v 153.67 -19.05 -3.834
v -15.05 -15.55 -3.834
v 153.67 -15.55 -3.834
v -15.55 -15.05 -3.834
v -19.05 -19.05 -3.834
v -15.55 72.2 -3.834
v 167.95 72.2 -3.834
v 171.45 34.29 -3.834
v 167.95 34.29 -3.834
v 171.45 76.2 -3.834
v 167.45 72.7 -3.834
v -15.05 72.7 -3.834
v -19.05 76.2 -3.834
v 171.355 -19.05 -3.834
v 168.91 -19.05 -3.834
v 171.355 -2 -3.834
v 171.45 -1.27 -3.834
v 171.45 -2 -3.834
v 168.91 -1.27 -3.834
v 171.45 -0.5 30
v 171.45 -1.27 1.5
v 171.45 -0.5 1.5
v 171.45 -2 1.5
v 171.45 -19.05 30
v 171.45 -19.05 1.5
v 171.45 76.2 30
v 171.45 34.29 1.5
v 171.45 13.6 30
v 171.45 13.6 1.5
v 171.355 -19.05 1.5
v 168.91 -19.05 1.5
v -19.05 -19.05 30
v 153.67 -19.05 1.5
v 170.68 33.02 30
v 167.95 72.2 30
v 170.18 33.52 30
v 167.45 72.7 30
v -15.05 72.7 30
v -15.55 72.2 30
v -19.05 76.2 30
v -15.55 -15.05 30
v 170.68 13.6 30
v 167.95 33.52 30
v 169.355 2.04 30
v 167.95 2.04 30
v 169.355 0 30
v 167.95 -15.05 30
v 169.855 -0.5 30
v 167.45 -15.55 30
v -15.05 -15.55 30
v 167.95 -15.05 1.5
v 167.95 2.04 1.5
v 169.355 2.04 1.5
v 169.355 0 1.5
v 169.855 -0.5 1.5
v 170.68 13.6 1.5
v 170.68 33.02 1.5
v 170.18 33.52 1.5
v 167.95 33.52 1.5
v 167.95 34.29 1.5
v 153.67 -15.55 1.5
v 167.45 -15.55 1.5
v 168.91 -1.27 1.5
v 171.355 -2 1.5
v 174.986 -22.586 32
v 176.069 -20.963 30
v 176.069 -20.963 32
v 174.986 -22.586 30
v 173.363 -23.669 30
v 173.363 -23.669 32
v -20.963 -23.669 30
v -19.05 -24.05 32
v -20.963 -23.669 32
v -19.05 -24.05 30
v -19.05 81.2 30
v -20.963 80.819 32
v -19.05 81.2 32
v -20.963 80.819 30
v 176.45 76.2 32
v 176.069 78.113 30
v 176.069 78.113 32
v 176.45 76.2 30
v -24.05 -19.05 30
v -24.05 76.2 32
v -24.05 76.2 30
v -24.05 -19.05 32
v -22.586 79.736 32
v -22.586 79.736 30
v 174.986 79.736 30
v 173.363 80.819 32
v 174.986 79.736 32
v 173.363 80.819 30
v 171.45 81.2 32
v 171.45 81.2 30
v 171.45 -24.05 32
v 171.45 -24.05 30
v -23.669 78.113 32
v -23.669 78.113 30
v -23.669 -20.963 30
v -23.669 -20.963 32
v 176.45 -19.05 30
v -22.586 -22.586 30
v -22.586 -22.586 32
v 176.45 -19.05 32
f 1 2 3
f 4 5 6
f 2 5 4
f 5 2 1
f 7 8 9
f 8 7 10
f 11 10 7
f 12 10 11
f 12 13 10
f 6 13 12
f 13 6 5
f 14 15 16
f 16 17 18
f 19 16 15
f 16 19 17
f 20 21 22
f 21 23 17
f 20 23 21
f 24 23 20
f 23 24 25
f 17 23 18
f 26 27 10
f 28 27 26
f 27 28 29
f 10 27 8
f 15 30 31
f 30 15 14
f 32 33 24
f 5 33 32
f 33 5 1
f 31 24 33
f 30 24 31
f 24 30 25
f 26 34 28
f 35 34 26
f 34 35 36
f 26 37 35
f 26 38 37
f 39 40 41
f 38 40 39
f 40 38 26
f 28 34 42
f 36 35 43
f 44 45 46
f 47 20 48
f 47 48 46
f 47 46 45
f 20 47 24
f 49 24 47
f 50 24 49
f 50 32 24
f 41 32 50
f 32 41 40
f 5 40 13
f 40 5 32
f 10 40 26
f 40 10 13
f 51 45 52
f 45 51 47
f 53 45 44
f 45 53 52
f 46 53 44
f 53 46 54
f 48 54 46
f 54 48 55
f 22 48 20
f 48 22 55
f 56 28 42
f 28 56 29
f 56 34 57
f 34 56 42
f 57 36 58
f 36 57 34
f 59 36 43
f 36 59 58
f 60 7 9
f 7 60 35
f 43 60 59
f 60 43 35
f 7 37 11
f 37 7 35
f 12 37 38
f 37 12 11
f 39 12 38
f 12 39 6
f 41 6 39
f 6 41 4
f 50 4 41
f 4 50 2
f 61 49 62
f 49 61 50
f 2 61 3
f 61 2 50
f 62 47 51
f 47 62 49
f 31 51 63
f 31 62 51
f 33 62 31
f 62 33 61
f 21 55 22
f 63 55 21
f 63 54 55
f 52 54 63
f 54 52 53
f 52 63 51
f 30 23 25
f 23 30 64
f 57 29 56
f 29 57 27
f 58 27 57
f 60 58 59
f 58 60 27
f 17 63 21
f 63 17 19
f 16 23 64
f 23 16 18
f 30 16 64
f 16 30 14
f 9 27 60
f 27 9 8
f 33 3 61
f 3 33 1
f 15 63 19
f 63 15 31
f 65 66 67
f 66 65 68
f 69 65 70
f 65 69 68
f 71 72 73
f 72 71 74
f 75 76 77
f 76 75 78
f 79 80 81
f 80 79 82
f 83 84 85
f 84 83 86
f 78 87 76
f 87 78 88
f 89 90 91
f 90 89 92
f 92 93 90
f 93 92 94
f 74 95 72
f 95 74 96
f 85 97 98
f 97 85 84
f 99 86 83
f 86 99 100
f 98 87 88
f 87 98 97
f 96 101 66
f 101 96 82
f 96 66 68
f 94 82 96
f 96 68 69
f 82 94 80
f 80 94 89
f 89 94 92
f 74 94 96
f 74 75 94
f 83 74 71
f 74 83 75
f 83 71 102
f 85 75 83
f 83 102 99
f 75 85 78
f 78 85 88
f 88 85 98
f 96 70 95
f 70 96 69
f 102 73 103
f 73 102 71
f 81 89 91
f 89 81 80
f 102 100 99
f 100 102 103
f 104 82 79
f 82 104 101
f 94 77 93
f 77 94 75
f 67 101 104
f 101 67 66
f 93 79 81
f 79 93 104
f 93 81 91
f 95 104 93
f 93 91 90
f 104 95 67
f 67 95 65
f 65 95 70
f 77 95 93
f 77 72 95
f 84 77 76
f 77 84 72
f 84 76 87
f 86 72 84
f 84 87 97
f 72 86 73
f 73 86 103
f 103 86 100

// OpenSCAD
// file: ../../../lib/circuits/helpers.scad
function bu(u) = u * 2.54;

module breadboard_row(number, orientation="vertical") {
  children();
  if(number > 1) {
    if(orientation == "vertical") {
      translate([0,bu(1),0])
        breadboard_row(number-1, orientation=orientation) {
          children();
        }
    } else {
      translate([bu(1),0,0])
        breadboard_row(number-1, orientation=orientation){
          children();
        }
    }
  }
}
// file: ../../../lib/switches/rgb.scad
include <../variables.scad>

module rgb_row_trace_connection(width, height, xpos, ypos, rgb, connections) {
  half_width = u_mm(width)/2;
  half_height = u_mm(height)/2;
  if(connections[3] == "connect") {
    translate([1-half_width,8.875,0]){
      circle(d=0.8,$fn=40);
      offset(0.4)
        polygon(points=[[0,-0.01],[0,0.01],[u_mm(-xpos)-2, u_mm(-ypos)+0.01],[u_mm(-xpos)-2, u_mm(-ypos)-0.01]]);
    }
    translate([1-half_width,4.9,0]){
      circle(d=0.8,$fn=40);
      offset(0.4)
        polygon(points=[[0,-0.01],[0,0.01],[u_mm(-xpos)-2, u_mm(-ypos)+0.01],[u_mm(-xpos)-2, u_mm(-ypos)-0.01]]);
    }
    translate([1-half_width,3.3,0]){
      circle(d=0.8,$fn=40);
      offset(0.4)
        polygon(points=[[0,-0.01],[0,0.01],[u_mm(-xpos)-2, u_mm(-ypos)+0.01],[u_mm(-xpos)-2, u_mm(-ypos)-0.01]]);
    }
  }
  if(connections[2] == "connect") {
    translate([half_width-1,8.875,0]) {
      circle(d=0.8,$fn=40);
    }
    translate([half_width-1,4.9,0]) {
      circle(d=0.8,$fn=40);
    }
    translate([half_width-1,3.3,0]){
      circle(d=0.8,$fn=40);
    }
  }
}

module rgb_pcb_drill(width=1, height=1, rgb=true, connections=["hole","hole","hole","hole"]) {
  half_width = u_mm(width)/2;
  half_height = u_mm(height)/2;
  translate([half_width,half_height,0]) {
    if(rgb == true) {
      // LED Hole
      translate([-1.875,3.4])
        square([3.75,3]);

      // LED D
      if(connections[3] == "hole")
        translate([1.3-half_width,8,0])
          circle(d=1,$fn=40);
      if(connections[2] == "hole")
        translate([half_width-1.3,8,0])
          circle(d=1,$fn=40);

      // LED G
      if(connections[3] == "hole")
        translate([1.3-half_width,5.4,0])
          circle(d=1,$fn=40);
      if(connections[2] == "hole")
        translate([half_width-1.3,5.4,0])
          circle(d=1,$fn=40);

      // LED V
      if(connections[3] == "hole")
        translate([1.3-half_width,2.8,0])
          circle(d=1,$fn=40);
      if(connections[2] == "hole")
        translate([half_width-1.3,2.8,0])
          circle(d=1,$fn=40);
    }

    children();
  }
}

module rgb_pcb_hole_traces(width=1, height=1, rgb=true, xpos=0, ypos=0, connections=["hole","hole","hole","hole"]) {
  half_width = u_mm(width)/2;
  half_height = u_mm(height)/2;
  translate([half_width,half_height,0]) {
    if(rgb == true) {
      // LED D
      if(connections[3] == "hole")
        translate([1.3-half_width,8,0])
          circle(d=2.5,$fn=40);
      if(connections[2] == "hole")
        translate([half_width-1.3,8,0])
          circle(d=2.5,$fn=40);

      // LED G
      if(connections[3] == "hole")
        translate([1.3-half_width,5.4,0])
          circle(d=2.5,$fn=40);
      if(connections[2] == "hole")
        translate([half_width-1.3,5.4,0])
          circle(d=2.5,$fn=40);

      // LED V
      if(connections[3] == "hole")
        translate([1.3-half_width,2.8,0])
          circle(d=2.5,$fn=40);
      if(connections[2] == "hole")
        translate([half_width-1.3,2.8,0])
          circle(d=2.5,$fn=40);
    }

    children();
  }
}

module rgb_pcb_traces(width=1, height=1, rgb=true, xpos=0, ypos=0, connections=["hole","hole","hole","hole"]) {
  half_width = u_mm(width)/2;
  half_height = u_mm(height)/2;
  rgb_pcb_hole_traces(width=width, height=height, rgb=rgb, connections=connections) {
    if(rgb == true) {
      rgb_row_trace_connection(width=width, height=height, xpos=xpos, ypos=ypos, rgb=rgb, connections=connections);
      v_left = connections[3] == "none" ? 1 : half_width-5;
      // LED G
      translate([1.25,5])
        square([2,2]);
      translate([2.7,8.5,0]) {
        length = connections[2] == "none" ? 2 : half_width-3.7; 
        square([length,0.75]);
      }
      translate([2.7,6.8])
        square([0.8,2.4]);
      translate([-3.5,6.2])
        square([7,0.8]);
      translate([-3.5,6.8])
        square([0.8,2.4]);
      translate([-4-v_left,8.5,0])
        square([v_left+1,0.75]);

      // LED D
      translate([-4-v_left,4.5,0])
        square([v_left,0.8]);
      translate([-4.5,4.5,0])
        square([0.8,1.3]);
      translate([-4.5,5,0])
        square([1.3,0.8]);
      translate([2,4,0])
        square([2,0.8]);
      translate([4,4,0])
        square([0.8,1.3]);
      translate([4,4.5,0]) {
        length = connections[2] == "none" ? 0 : half_width-5; 
        square([length,0.75]);
      }
      translate([-3.375,5])
        square([2,1.1]);
      translate([1.25,3.75])
        square([2,1.1]);

      // LED V
      v_right = connections[2] == "none" ? 0 : half_width-5.25;
      translate([-4-v_left,2.9,0])
        square([v_right+v_left+8.875,0.8]);
      translate([-3.375,3.5])
        square([2,1.35]);
    }

    children();
  }
}
// file: ../../../lib/switches/base.scad
include <../variables.scad>
include <rgb.scad>

// ["top", "bottom", "left", "right"]

module switch_row_trace_connection(width, height, xpos, ypos, rgb, connections) {
  half_width = u_mm(width)/2;
  half_height = u_mm(height)/2;
  if(connections[3] == "connect") {
    translate([1-half_width,-5.5,0]){
      circle(d=0.8,$fn=40);
      offset(0.4)
        polygon(points=[[0,-0.01],[0,0.01],[u_mm(-xpos)-2, u_mm(-ypos)+0.01],[u_mm(-xpos)-2, u_mm(-ypos)-0.01]]);
    }
  }
  if(connections[2] == "connect") {
    translate([half_width-1,-5.5,0]) {
      circle(d=0.8,$fn=40);
    }
  }
}

module switch_column_trace_connection(width, height, xpos, ypos, rgb, connections, last_xpos=0, last_ypos=0) {
  half_width = u_mm(width)/2;
  half_height = u_mm(height)/2;
  if(connections[1] == "connect") {
    translate([-u_mm((width-1)/2)-0.9,half_height-1,0]) {
      circle(d=0.8,$fn=40);
      offset(0.4)
        polygon(points=[[0,-0.01],[0,0.01],[u_mm((width-1)/2),0.01],[u_mm((width-1)/2),-0.01]]);
    }
  }
  if(connections[0] == "connect") {
    y_off = u_mm(ypos-last_ypos);
    x_off = u_mm(last_xpos-xpos);
    translate([-0.875,-1-y_off-half_height,0]) {
      offset(0.4)
        polygon(points=[[-0.01+x_off,0],[0.01+x_off,0],[0.01,2+y_off],[-0.01,2+y_off]]);
      translate([x_off-0.01,0]) {
        offset(0.4)
          polygon(points=[[0,-0.01],[0,0.01],[u_mm((width-1)/2)+1,0.01],[u_mm((width-1)/2)+1,-0.01]]);
      }
    }
  }
}

module switch_base_pcb_drill(width=1, height=1, rgb=true, single=true, connections=["hole","hole","hole","hole"]) {
  half_width = u_mm(width)/2;
  half_height = u_mm(height)/2;
  rgb_pcb_drill(width=width, height=height, rgb=rgb, connections=connections) {
    // Row
    if(connections[2] == "hole")
      translate([half_width-1.3,-5.5,0])
        circle(d=1,$fn=40);
    if(connections[3] == "hole")
      translate([1.3-half_width,-5.5,0])
        circle(d=1,$fn=40);

    // Column
    if(connections[1] == "hole")
      translate([-1,half_height-1.25,0])
        circle(d=1,$fn=40);
    if(connections[0] == "hole")
      translate([-1,1.25-half_height,0])
        circle(d=1,$fn=40);

    children();
  }
}

module switch_base_pcb_traces(width=1, height=1, rgb=true, xpos=0, ypos=0, connections=["hole","hole","hole","hole"], last_xpos=0, last_ypos=0, single=true) {
  half_width = u_mm(width)/2;
  half_height = u_mm(height)/2;
  rgb_pcb_traces(width=width, height=height, rgb=rgb, xpos=xpos, ypos=ypos, connections=connections) {
    switch_row_trace_connection(width, height, xpos, ypos, rgb, connections);
    if(single && !rgb)
      switch_column_trace_connection(width, height, xpos, ypos, rgb, connections, last_xpos=last_xpos, last_ypos=last_ypos);

    // Row
    if(connections[2] == "hole")
      translate([half_width-1.3,-5.5,0])
        circle(d=2.5,$fn=40);
    if(connections[3] == "hole")
      translate([1.3-half_width,-5.5,0])
        circle(d=2.5,$fn=40);

    // Column
    if(connections[1] == "hole")
      translate([-1,half_height-1.25,0])
        circle(d=2.4,$fn=40);
    if(connections[0] == "hole")
      translate([-1,1.25-half_height,0])
        circle(d=2.4,$fn=40);

    children();
  }
}

module switch_base_pcb_traces_bottom(width=1, height=1, rgb=true, xpos=0, ypos=0, connections=["hole","hole","hole","hole"], last_xpos=0, last_ypos=0) {
  half_width = u_mm(width)/2;
  half_height = u_mm(height)/2;
  rgb_pcb_hole_traces(width=width, height=height, rgb=rgb, connections=connections) {
    switch_column_trace_connection(width, height, xpos, ypos, rgb, connections, last_xpos=last_xpos, last_ypos=last_ypos);

    // Row
    if(connections[2] == "hole")
      translate([half_width-1.3,-5.5,0])
        circle(d=2.5,$fn=40);
    if(connections[3] == "hole")
      translate([1.3-half_width,-5.5,0])
        circle(d=2.5,$fn=40);

    // Column
    if(connections[1] == "hole")
      translate([-1,half_height-1.25,0])
        circle(d=2.5,$fn=40);
    if(connections[0] == "hole")
      translate([-1,1.25-half_height,0])
        circle(d=2.5,$fn=40);

    children();
  }
}
// file: ../../../lib/switches/footprints.scad
include <../variables.scad>
include <stabilizers.scad>

module pcb_switch_outline(width=1, height=1) {
  stab_extra = width >= 2 ? 2 : 0;
  translate([0,-stab_extra])
    square([u_mm(width)+0.01, u_mm(height)+0.01+stab_extra]);
}

module pcb_switch_space_outline(width=1, height=1, style="mx", cnc=false) {
  offset = height_for_style(style);
  stab_extra = width >= 2 ? 2 : 0;
  translate([-1,-1-stab_extra,2.834-offset])
    cube([u_mm(width) + 2, u_mm(height) + 2 + stab_extra, 1.166+offset]);
  translate([u_mm(width/2),u_mm(height/2)]) {
    translate([-7.5,-7.5,1.5-offset])
      cube([15,15,5]);
    translate([-7,-7,-10])
      cube([14,14,10]);
    translate([u_mm(-width/2)-0.5,u_mm(-height/2)-0.5,-20-offset])
      cube([u_mm(width)+1,u_mm(height)+1, 20]);
  }
  translate([hole_offset(width), hole_offset(height),-10])
    stab(width);
}
// file: ../../../lib/switches/stabilizers.scad
module stab_hole_render(distance){
  translate([14+distance+3.375,6.99,0]) {
    circle(d=3.175, $fn=40);
    translate([0,-15.24,0])
      circle(d=4.064, $fn=40);
  }
  translate([-6.75-distance+3.375,6.99,0]) {
    circle(d=3.175, $fn=40);
    translate([0,-15.24,0])
      circle(d=4.064, $fn=40);
  }
}

module stab_holes(width) {
  if (width >= 7) {
    stab_hole_render(39.6);
  } else if (width >= 6) {
    stab_hole_render(39.6);
  } else if(width >= 2) {
    stab_hole_render(1.6);
  }
}

module stab_render(distance, cnc=false, height=5.334) {
  translate([14+distance,1.47,0]){
    // Right Side Large Hole
    cube([6.75,12.3,10]);

    // Add 1/16" corner holes for milling
    if(cnc){
      translate([0.56,0.56,0])
        cylinder(h=10,d=1.59,$fn=20);
      translate([6.75-0.56,0.56,0])
        cylinder(h=10,d=1.59,$fn=20);
      translate([0.56,12.3-0.56,0])
        cylinder(h=10,d=1.59,$fn=20);
      translate([6.75-0.56,12.3-0.56,0])
        cylinder(h=10,d=1.59,$fn=20);
    }
    translate([5.75,3.23,0]){
      // Side hole for notch
      cube([1.825,3.175,10]);
      translate([1.825,1.59,0])
        if(cnc)
          resize([1.59,3.175,10])
            cylinder(h=10,d=1.59,$fn=20);
    }
    translate([1.725,11.3,0]){
      // Top Notch
      cube([3.3,2.2,10]);
      if(cnc)
        translate([1.65,2.2,0])
          resize([3.3,1,10])
            cylinder(h=10,d=1,$fn=20);
    }
    // Thin out for clip
    translate([-1,-1,10-height+1.5])
      cube([8.75,14.3,height-1.5]);
  }
  translate([-6.75-distance,1.47,0]){
    // Left Side Large Hole
    cube([6.75,12.3,10]);
    translate([-0.825,3.23,0]){
      // Side hole for notch
      cube([1.825,3.175,10]);
      if(cnc)
        translate([0,1.59,0])
          resize([1.59,3.175,10])
            cylinder(h=10,d=1.59,$fn=20);

    }
    translate([1.725,11.3,0]){
      // Top Notch
      cube([3.3,2.2,10]);
      if(cnc)
        translate([1.65,2.2,0])
          resize([3.3,1,10])
            cylinder(h=10,d=1,$fn=20);
    }
    if(cnc){
      translate([0.56,0.56,0])
        cylinder(h=10,d=1.59,$fn=20);
      translate([6.75-0.56,0.56,0])
        cylinder(h=10,d=1.59,$fn=20);
      translate([0.56,12.3-0.56,0])
        cylinder(h=10,d=1.59,$fn=20);
      translate([6.75-0.56,12.3-0.56,0])
        cylinder(h=10,d=1.59,$fn=20);
    }
    // Thin out for clip
    translate([-1,-1,10-height+1.5])
      cube([8.75,14.3,height-1.5]);
  }
  // Center shaft for bar
  translate([-distance-2,4.7,0]){
    cube([distance*2+20,4.6,10]);
  }
}

module stab(key_width, cnc=false) {
  if (key_width >= 7) {
    stab_render(39.6, cnc=cnc);
  } else if (key_width >= 6) {
    stab_render(39.6, cnc=cnc);
  } else if(key_width >= 2) {
    stab_render(1.6, cnc=cnc);
  }
}
// file: ../../../lib/circuits/wire.scad
module guage(guage=12) {
  fn=20;
  if(guage == 8) {
    circle(d=3.25, $fn=fn);
  } else if (guage == 10) {
    circle(d=2.59, $fn=fn);
  } else if (guage == 12) {
    circle(d=2.06, $fn=fn);
  } else if (guage == 14) {
    circle(d=1.57, $fn=fn);
  } else if (guage == 16) {
    circle(d=1.3, $fn=fn);
  }
}

module wire_pcb_drill(guage=12) {
  offset(0.1)
    guage(guage);
}

module wire_pcb_traces(guage=12) {
  offset(0.75)
    guage(guage);
}

module wire_pcb_outline(guage=12) {
  offset(1.5)
    guage(guage);
}

module wire_space_outline(guage=12) {
  linear_extrude(10)
    offset(0.1)
      guage(guage);
}
// file: ../../../lib/circuits/trrs.scad
module trrs_post(d=1.2) {
  translate([0,-d/4,0]) {
    circle(d=d, $fn=20);
    translate([-d/2,0,0]) {
      square([d,(d/2-.2)]);
    }
    translate([0,(d/2-.2),0]) {
      circle(d=d, $fn=20);
    }
  }
}

module trrs_pcb_drill(side="left") {
  translate([2.8,1.5]) {
    circle(d=2, $fn=20);
  }
  translate([2.8,8.5]) {
    circle(d=2, $fn=20);
  }
  translate([0.5,11.3,0]) {
    trrs_post();
  }
  translate([5.1,3.2,0]) {
    trrs_post();
  }
  translate([5.1,6.2,0]) {
    trrs_post();
  }
  translate([5.1,10.2,0]) {
    trrs_post();
  }
  if(side != "none"){
    offset = side == "left" ? 7.6 : -2;
    translate([offset,11.3]) {
      circle(d=1.2, $fn=20);
    }
    translate([offset,8.3]) {
      circle(d=1.2, $fn=20);
    }
    translate([offset,5.3]) {
      circle(d=1.2, $fn=20);
    }
    translate([offset,2.2]) {
      circle(d=1.2, $fn=20);
    }
  }
}

module trrs_pcb_traces(side="left") {
  translate([-1,9.7,0]){
    difference() {
      square([3,3]);
      if(side == "right") {
        translate([3,-1.8]) {
          rotate(45) {
            square(2);
          }
        }
      }
    }
  }
  translate([3.6,1.2,0]){
    difference() {
      square([3,3.5]);
      if(side == "left") {
        translate([3,2.3]) {
          rotate(45) {
            square(2);
          }
        }
      }
    }
  }
  translate([3.6,4.8,0]){
    difference() {
        square([3,3.5]);
        if(side == "left") {
          translate([3,2.3]) {
            rotate(45) {
              square(2);
            }
          }
        }
    }
  }
  translate([3.6,8.4,0]){
    difference() {
      square([3,3.2]);
      if(side == "left") {
        translate([3,1.8]) {
          rotate(45) {
            square(2);
          }
        }
      }
    }
  }
  if(side != "none"){
    translate([side == "left" ? 7.6 : -2,0,0]){
      translate([0,11.3]) {
        circle(d=3, $fn=20);
      }
      translate([0,8.3]) {
        circle(d=2.9, $fn=20);
      }
      translate([0,5.3]) {
        circle(d=3, $fn=20);
      }
      translate([0,2.2]) {
        circle(d=3, $fn=20);
      }
    }
    translate([side == "left" ? 5.6 : -2,0,0]){
      left_trace = side == "left" ? 2.5 : 7.6;
      translate([0,2.2]) {
        square([left_trace,1.5]);
      }
      translate([0,5.1]) {
        square([left_trace,1.5]);
      }
      if(side == "left") {
        translate([0,8.7]) {
          square([left_trace,0.9]);
        }
      }
      else {
        translate([0,8]) {
          square([4,1.6]);
        }
        translate([4,9]) {
          square([4,1.6]);
        }
        translate([2.8,9.4]) {
          rotate(-45) {
            square([1,1.7]);
          }
        }
      }
    }
    translate([side == "left" ? 0.5 : -2,0,0]){
      right_trace = side == "left" ? 7.1 : 2;
      translate([0,11.7]) {
        square([right_trace,1.3]);
      }
      translate([0,12]) {
        circle(1, $fn=20);
      }
      translate([right_trace,11.8]) {
        circle(1, $fn=20);
      }
    }
  }
}

module trrs_pcb_outline(side="left") {
  translate([-1,0,0]) {
    square([7.6,13.1]);
  }
  if(side != "none"){
    translate([side == "left" ? 5.6 : -3.5, 0]) {
      square([4,13.1]);
    }
  }
}

module trrs_space_outline(side="left") {
  translate([0,0,-5.3]) {
    linear_extrude(7){
      translate([-2,-1,0])
        square([9.6,15.1]);
      translate([0,-12.1,0])
        square([5.6,12.1]);
      if(side != "none")
        translate([side == "left" ? 5.6 : -4.5, -1])
          square([5,15.1]);
    }
  }
  translate([3,-2,-2.6]) {
    rotate([90,0,0]) {
      cylinder(d=10, h=30, $fn=100);
    }
  }
}
// file: ../../../lib/circuits/trace.scad
function vdef(vector, index) = len(vector) == index ? vector[index-1] : vector[index];
function vadd(vector, index, axis) = vdef(vector, index)[axis] > vdef(vector, index-1)[axis] ? 0.01 : -0.01;
function polygon_from_vector(vector) = 
  len(vector) > 0 ?
    concat(vector, 
      [for (i = [1:len(vector)]) 
        [vector[len(vector)-i][0]-vadd(vector, i, 0),vector[len(vector)-i][1]-vadd(vector, i, 1)]])
      : [];

function parse_loc(loc) = [
  loc[5],
  len(loc) < 7 ? "both" : loc[6],
  len(loc) < 8 ? "none" : loc[7],
];

module manual_trace_pcb_drill(location) {
  vector = parse_loc(location)[0];
  echo("holes", parse_loc(location)[2]);
  if(parse_loc(location)[2] == "holes" || parse_loc(location)[2] == "hole_begin") {
    translate(vector[0]) {
      circle(d=1, $fn=20);
    }
  }
  if(parse_loc(location)[2] == "holes" || parse_loc(location)[2] == "hole_end") {
    translate(vector[len(vector)-1]) {
      circle(d=1, $fn=20);
    }
  }
}

module manual_trace_pcb_traces(location) {
  vector = parse_loc(location)[0];
  if(parse_loc(location)[1] != "bottom") {
    offset(0.4) {
      polygon(points=polygon_from_vector(vector));
    }
  }
  if(parse_loc(location)[2] == "holes" || parse_loc(location)[2] == "hole_begin") {
    translate(vector[0]) {
      circle(d=2.5, $fn=20);
    }
  }
  if(parse_loc(location)[2] == "holes" || parse_loc(location)[2] == "hole_end") {
    translate(vector[len(vector)-1]) {
      circle(d=2.5, $fn=20);
    }
  }
}

module manual_trace_pcb_traces_bottom(location) {
  vector = parse_loc(location)[0];
  if(parse_loc(location)[1] != "top") {
    offset(0.4) {
      polygon(points=polygon_from_vector(vector));
    }
  }
  if(parse_loc(location)[2] == "holes" || parse_loc(location)[2] == "hole_begin") {
    translate(vector[0]) {
      circle(d=2.5, $fn=20);
    }
  }
  if(parse_loc(location)[2] == "holes" || parse_loc(location)[2] == "hole_end") {
    translate(vector[len(vector)-1]) {
      circle(d=2.5, $fn=20);
    }
  }
}

module manual_trace_pcb_outline(location) {
  vector = parse_loc(location)[0];
  echo("location", location);
  offset(1)
    polygon(points=polygon_from_vector(vector));

  if(parse_loc(location)[2] == "holes" || parse_loc(location)[2] == "hole_begin") {
    translate(vector[0]) {
      circle(d=4, $fn=20);
    }
  }
  if(parse_loc(location)[2] == "holes" || parse_loc(location)[2] == "hole_end") {
    translate(vector[len(vector)-1]) {
      circle(d=4, $fn=20);
    }
  }
}

module manual_trace_space_outline(location) {
  vector = parse_loc(location)[0];
  translate([0,0,-1])
    linear_extrude(2)
      offset(0.5)
        manual_trace_pcb_outline(vector);
}
// file: ../../../lib/circuits/support.scad
module support_pcb_drill(mm=2) {
  offset(0.1)
    circle(d=mm, $fn=20);
}

module support_pcb_traces(mm=2) {
}

module support_pcb_outline(mm=2) {
  offset(2)
    circle(d=mm, $fn=20);
}

module support_space_outline(mm=2) {
  linear_extrude(10)
    offset(0.1)
      circle(d=mm, $fn=20);
}
// file: ../../../lib/circuits/proton_c.scad
use <helpers.scad>

module proton_c_pcb_drill(size="full") {
  translate([bu(0.5),bu(1.5),0]) {
    translate([0,bu(1)])
      breadboard_row(4, "horizontal"){
        circle(d=1, $fn=20);
        translate([0,bu(1)])
          circle(d=1, $fn=20);
      }
    translate([bu(4),bu(1)])
      breadboard_row(2)
        circle(d=1, $fn=20);
    translate([bu(4),bu(3)])
      breadboard_row(2)
        circle(d=1, $fn=20);
    circle(d=1, $fn=20);
    translate([bu(1),0,0])
      circle(d=1, $fn=20);
    translate([bu(5),0,0])
      circle(d=1, $fn=20);
    translate([bu(6),0,0])
      circle(d=1, $fn=20);
    breadboard_row(12) {
      circle(d=1, $fn=20);
      translate([bu(1),0,0])
        circle(d=1, $fn=20);
      translate([bu(5),0,0])
        circle(d=1, $fn=20);
      translate([bu(6),0,0])
        circle(d=1, $fn=20);
    }
    if(size == "full")
      translate([0,bu(13)])
        breadboard_row(6) {
          circle(d=1, $fn=20);
          translate([bu(1),0,0])
            circle(d=1, $fn=20);
          translate([bu(5),0,0])
            circle(d=1, $fn=20);
          translate([bu(6),0,0])
            circle(d=1, $fn=20);
    }
  }
}

module proton_c_pcb_traces(size="full") {
  translate([bu(0.5),bu(1.5),0]) {
    translate([0,bu(1)])
      breadboard_row(4, "horizontal"){
        circle(d=2.4, $fn=20);
        translate([-1,0])
          square([2,bu(1)]);
        translate([0,bu(1)])
          circle(d=2.4, $fn=20);
      }
    translate([0,bu(1)])
      breadboard_row(2) {
        translate([bu(5),0])
          circle(d=2.4, $fn=20);
        translate([bu(5),-1,0])
          square([bu(1),2]);
        translate([bu(6),0,0])
          circle(d=2.4, $fn=20);
      }
    translate([bu(4),bu(1)]){
      translate([-0.75,-1])
        square([1.5,bu(2)-2]);
      breadboard_row(2)
        circle(d=2.4, $fn=20);
      translate([0,-0.75])
        square([bu(2),1.5]);
    }
    translate([bu(4),bu(3)]){
      translate([-0.75,-1])
        square([1.5,bu(2)-2]);
      breadboard_row(2)
        circle(d=2.4, $fn=20);
      translate([0,-0.75])
        square([bu(2),1.5]);
    }
    circle(d=2.4, $fn=20);
    translate([0,-1,0])
      square([bu(1),2]);
    translate([bu(1),0,0])
      circle(d=2.4, $fn=20);
    translate([bu(5),0])
      circle(d=2.4, $fn=20);
    translate([bu(5),-1,0])
      square([bu(1),2]);
    translate([bu(6),0,0])
      circle(d=2.4, $fn=20);
    translate([0,bu(3)])
      breadboard_row(9) {
        circle(d=2.4, $fn=20);
        translate([0,-1,0])
          square([bu(1),2]);
        translate([bu(1),0,0])
          circle(d=2.4, $fn=20);
        translate([bu(5),0])
          circle(d=2.4, $fn=20);
        translate([bu(5),-1,0])
          square([bu(1),2]);
        translate([bu(6),0,0])
          circle(d=2.4, $fn=20);
      }
    if(size == "full")
      translate([0,bu(13)])
        breadboard_row(6) {
          circle(d=2.4, $fn=20);
          translate([0,-1,0])
            square([bu(1),2]);
          translate([bu(1),0,0])
            circle(d=2.4, $fn=20);
          translate([bu(5),0])
            circle(d=2.4, $fn=20);
          translate([bu(5),-1,0])
            square([bu(1),2]);
          translate([bu(6),0,0])
            circle(d=2.4, $fn=20);
        }
  }
}

module proton_c_pcb_outline(size="full") {
  translate([0,bu(1)])
  square([bu(7), bu(size == "full" ? 19 : 12)]);
}

module proton_c_space_outline(size="full") {
  translate([0,0,-4]) {
    linear_extrude(6) {
      translate([-bu(0.5),-bu(0.5)])
        square([bu(8), bu(size == "full" ? 21 : 14)]);
    }
    linear_extrude(5) {
      translate([bu(0.5),-bu(15),0])
        square([bu(6),bu(25)]);
    }
  }
}
// file: ../../../lib/circuits/pro_micro.scad
use <helpers.scad>

module pro_micro_pcb_drill(connections="holes") {
  translate([bu(0.5),bu(1.5),0]) {
    if(connections == "holes"){
      translate([bu(3),bu(1)])
        breadboard_row(3)
          circle(d=1, $fn=20);
      translate([bu(4),bu(3)])
        breadboard_row(3)
          circle(d=1, $fn=20);
    }
    breadboard_row(12) {
      circle(d=1, $fn=20);
      if(connections == "holes") {
        translate([bu(1),0,0])
          circle(d=1, $fn=20);
        translate([bu(5),0,0])
          circle(d=1, $fn=20);
      }
      translate([bu(6),0,0])
        circle(d=1, $fn=20);
    }
  }
}

module pro_micro_pcb_traces(connections="holes") {
  translate([bu(0.5),bu(1.5),0]) {
    // GRND
    if(connections == "holes"){
      translate([bu(3),bu(1)]){
        translate([-0.75,-1])
          square([1.5,bu(3)-2]);
        breadboard_row(3)
          circle(d=2.4, $fn=20);
        translate([0,-0.75])
          square([bu(2),1.5]);
      }
      translate([bu(4),bu(3)]){
        translate([-0.75,-1])
          square([1.5,bu(3)-2]);
        breadboard_row(3)
          circle(d=2.4, $fn=20);
        translate([0,-0.75])
          square([bu(2),1.5]);
      }
    }
    breadboard_row(12) {
      circle(d=2.4, $fn=20);
      if(connections == "holes") {
        translate([0,-1,0])
          square([bu(1),2]);
        translate([bu(1),0,0])
          circle(d=2.4, $fn=20);
        translate([bu(5),0])  
          circle(d=2.4, $fn=20);
        translate([bu(5),-1,0])
          square([bu(1),2]);
      }
      translate([bu(6),0,0])
        circle(d=2.4, $fn=20);
    }
  }
}

module pro_micro_pcb_outline() {
  translate([0,bu(1)])
  square([bu(7), bu(12)]);
}

module pro_micro_space_outline() {
  translate([0,0,-4]) {
    linear_extrude(6) {
      translate([-bu(0.5),-bu(0.5)])
        square([bu(8), bu(14)]);
    }
    linear_extrude(5) {
      translate([bu(0.5),-bu(15),0])
        square([bu(6),bu(25)]);
    }
  }
}
// file: ../../../lib/circuits/mts_101.scad
use <../variables.scad>
module mts_101_pcb_drill() {
  translate([0,1.25]) {
    translate([2.5,0])
      square([3,1]);
    translate([1.25,0.5])
      circle(d=1,$fn=40);
    translate([6.75,0.5])
      circle(d=1,$fn=40);

    translate([2.5,4.75])
      square([3,1]);
    translate([1.25,5.25])
      circle(d=1,$fn=40);
    translate([6.75,5.25])
      circle(d=1,$fn=40);

    translate([4,10])
      circle(d=1,$fn=40);
    translate([1.25,10])
      circle(d=1,$fn=40);
    translate([6.75,10])
      circle(d=1,$fn=40);
  }
}

module mts_101_pcb_traces() {
  translate([0,1.25]) {
    translate([2,-0.5])
      square([4,2]);
    translate([1.25,0.5])
      circle(d=2,$fn=40);
    translate([6.75,0.5])
      circle(d=2,$fn=40);

    translate([2,4.25])
      square([4,2]);
    translate([1.25,5.25])
      circle(d=2,$fn=40);
    translate([6.75,5.25])
      circle(d=2,$fn=40);

    translate([4,10])
      circle(d=2,$fn=40);
    translate([1.25,9.5])
      square([6,1]);
    translate([1.25,10])
      circle(d=2,$fn=40);
    translate([6.75,10])
      circle(d=2,$fn=40);
  }
}

module mts_101_pcb_outline() {
  square([8,13]);
}

module mts_101_space_outline(, cnc=false) {
  translate([-0.5,-0.5,-10])
    cube([9,14, 14.4]);
  translate([4,6.5,-26]) {
    cylinder(d=6, h=18, $fn=30);
    cylinder(d=12, h=10, $fn=60);
  }
}
// file: ../../../lib/circuits/ec11.scad
use <../variables.scad>
use <../switches/base.scad>

module 1u_centered() {
  translate([u_mm(0.5),u_mm(0.5)])
    children();
}

module ec11_pcb_drill(single=false, connections=["hole","hole","hole","hole"]) {
  switch_base_pcb_drill(rgb=false, connections=connections) {
    // Key Column
    translate([-3,0,0])
      circle(d=1,$fn=40);

    // Key Row
    translate([7,2.5])
      circle(d=1, $fn=20);

    if(single) {
      translate([4.25,-3,0])
        circle(d=1, $fn=20);
      translate([-3,-3.25,0])
        circle(d=1,$fn=40);
    }
    translate([4.25,0,0])
      circle(d=1, $fn=20);

    translate([7,-2.5])
      circle(d=1, $fn=20);

    if(connections[3] == "hole"){
      translate([-5.5,2.5])
        circle(d=1, $fn=20);
      translate([-5.5,0])
        circle(d=1, $fn=20);
      translate([-5.5,-2.5])
        circle(d=1, $fn=20);
    }
    translate([-7.5,-2.5])
      circle(d=1, $fn=20);
    translate([-7.5,2.5])
      circle(d=1, $fn=20);
    translate([-7.5,0])
      circle(d=1, $fn=20);

    translate([-1.3,-6.25])
      square([2.6,1.5]);
    translate([-1.3,4.75])
      square([2.6,1.5]);
  }
}

module ec11_pcb_traces(single=false, connections=["hole","hole","hole","hole"]) {
  switch_base_pcb_traces(single=single, rgb=false, connections=connections) {
    // Key Row
    if(single){
      translate([2,2.2])
        square([4.5,0.8]);
      r_len = connections[0] != "none" ? u_mm(0.5)-1 : 6;
      l_len = connections[1] != "none" ? u_mm(0.5)-1 : 6;
      translate([2,-r_len])
        square([0.8,r_len+l_len]);
      if(connections[0] != "none")
        translate([-2,1-u_mm(0.5)])
          square([4,0.8]);
      if(connections[1] != "none")
        translate([-2.1,u_mm(0.5)-1.6])
          square([4.9,0.8]);
    }
    translate([7,2.5])
      circle(d=2.5,$fn=40);

    // Key Column
    if(connections[3] != "none")
      translate([1-u_mm(0.5),-6])
        square([u_mm(0.5)-4,1]);
    translate([-3.25,-6])
      square([0.8,5]);
    translate([-3,0])
      circle(d=2.5,$fn=40);

    if(single){
      translate([-3,-3.25])
        circle(d=2.5,$fn=40);
      translate([4.25,-3])
        circle(d=2.5,$fn=40);
    } else {
      translate([-3,-3.25])
        square([7.8,0.8]);
    }

    translate([7,-2.5])
      circle(d=2.5,$fn=40);
    translate([4.25,0]) {
      circle(d=2.5,$fn=40);
      rotate(-45)
        square([5,0.8]);
    }

    translate([4,-6])
      square([0.8,3]);
    if(connections[2] != "none")
      translate([4,-6])
        square([4.5,0.8]);

    if(connections[3] == "hole"){
      translate([-5.5,2.5])
        circle(d=2.25, $fn=20);
      translate([-5.5,0])
        circle(d=2.25, $fn=20);
      translate([-5.5,-2.5])
        circle(d=2.25, $fn=20);
    }
    translate([-7.5,-2.5])
      circle(d=2.25, $fn=20);
    translate([-7.5,2.5])
      circle(d=2.25, $fn=20);
    translate([-7.5,0])
      circle(d=2.25, $fn=20);
  }
}

module ec11_pcb_traces_bottom(connections=["hole","hole","hole","hole"]) {
  switch_base_pcb_traces_bottom(rgb=false, connections=connections) {
    // Key Row
    translate([2,2.2])
      square([4.5,0.8]);
    r_len = connections[0] != "none" ? u_mm(0.5)-1 : 6;
    l_len = connections[1] != "none" ? u_mm(0.5)-1 : 6;
    translate([2,-r_len])
      square([0.8,r_len+l_len]);
    
    if(connections[0] != "none")
      translate([-1.3,1-u_mm(0.5)])
        square([4,0.8]);
    if(connections[1] != "none")
      translate([-1,u_mm(0.5)-1.4])
        square([3.8,0.8]);
    translate([7,2.5])
      circle(d=2.5,$fn=40);

    // Key Column
    translate([-3,0])
      circle(d=2.5,$fn=40);

    translate([7,-2.5])
      circle(d=2.5,$fn=40);
    translate([4.25,0]) {
      circle(d=2.5,$fn=40);
    }

    if(connections[3] == "hole"){
      translate([-5.5,2.5])
        circle(d=2.25, $fn=20);
      translate([-5.5,0])
        circle(d=2.25, $fn=20);
      translate([-5.5,-2.5])
        circle(d=2.25, $fn=20);
    }
    translate([-7.5,-2.5])
      circle(d=2.25, $fn=20);
    translate([-7.5,2.5])
      circle(d=2.25, $fn=20);
    translate([-7.5,0])
      circle(d=2.25, $fn=20);
  }
}

module ec11_pcb_outline() {
  square([u_mm(1), u_mm(1)]);
}

module ec11_space_outline() {
  translate([-0.5,-0.5, -6])
    cube([u_mm(1)+1, u_mm(1)+1, 8]);
  1u_centered() {
    translate([0,0,-15])
      linear_extrude(15)
        circle(d=7, $fn=30);
    translate([0,0,-25])
      linear_extrude(15)
        circle(d=19, $fn=80);
  }
}
// file: ../../../lib/switches/choc_v1.scad
include <../variables.scad>
include <stabilizers.scad>
include <footprints.scad>

module switch_choc_v1_pcb_drill(width=1, height=1) {
  half_width = u_mm(width)/2;
  half_height = u_mm(height)/2;
  translate([half_width,half_height,0]) {
    circle(d=3.5, $fn=30);

    translate([-5.5,0])
      circle(d=2, $fn=30);
    translate([3,3.8])
      circle(d=1, $fn=30);
    translate([-4, 3.8])
      circle(d=1, $fn=30);
    translate([-4,1.25-half_height])
      circle(d=1, $fn=30);
    translate([-4, half_height-3])
      circle(d=1, $fn=30);

    translate([5.5,0])
      circle(d=2, $fn=30);
    translate([0,5.9])
      circle(d=1.3, $fn=30);
    translate([5,3.8])
      circle(d=1.3, $fn=30);
    translate([1-half_width, half_height-1])
      circle(d=1, $fn=30);
    translate([half_width-1, half_height-1])
      circle(d=1, $fn=30);
  }
}

module switch_choc_v1_pcb_traces(width=1, height=1) {
  half_width = u_mm(width)/2;
  half_height = u_mm(height)/2;
  translate([half_width,half_height,0]) {
    translate([5,3.8])
      circle(d=2.8, $fn=30);
    translate([3,3.8])
      circle(d=2.5, $fn=30);
    translate([-4, 3.8])
      circle(d=2.5, $fn=30);
    translate([-4.5, 2-half_height])
      square([1, u_mm(height)-4]);
    translate([-4,1.25-half_height])
      circle(d=2.5, $fn=30);
    translate([-4, half_height-3])
      circle(d=2.5, $fn=30);

    translate([0,5.9])
      circle(d=2.8, $fn=30);
    translate([-0.5, 5.9])
      square([1, half_height-6.9]);
    translate([1-half_width, half_height-1.5])
      square([half_width*2-2, 1]);
    translate([1-half_width, half_height-1])
      circle(d=2.5, $fn=30);
    translate([half_width-1, half_height-1])
      circle(d=2.5, $fn=30);
  }
}

module switch_choc_v1_pcb_outline(width=1, height=1) {
  pcb_switch_outline(width=width, height=height);
}
// file: ../../../lib/switches/mx.scad
include <../variables.scad>
include <stabilizers.scad>
include <footprints.scad>
include <base.scad>
include <rgb.scad>

module switch_mx_pcb_drill(width=1, height=1, rgb=true, single=true, connections=["hole","hole","hole","hole"]) {
  half_width = u_mm(width)/2;
  half_height = u_mm(height)/2;
  translate([hole_offset(width), half_height]) {
    stab_holes(width);
  }

  switch_base_pcb_drill(width=width, height=height, single=single, rgb=rgb, connections=connections) {
    circle(d=4,$fn=40);
    translate([-3.8,-2.5,0])
      circle(d=1.7,$fn=40);
    translate([2.5,-5,0])
      circle(d=1.7,$fn=40);
    translate([5,0,0])
      circle(d=1.75,$fn=40);
    translate([-5,0,0])
      circle(d=1.75,$fn=40);

    // Column
    translate([-1.2,-3,0])
      circle(d=1,$fn=40);
    translate([5,-2,0])
      circle(d=1,$fn=40);
    if(single){
      translate([6,-3.7,0])
        circle(d=1,$fn=40);
      if(rgb) {
        translate([5,1.7,0])
          circle(d=1,$fn=40);
      } else {
        translate([6,-8.3,0])
          circle(d=1,$fn=40);
      }
    }
  }
}

module switch_mx_pcb_traces(width=1, height=1, rgb=true, single=true, xpos=0, ypos=0, connections=["hole","hole","hole","hole"], last_xpos=0, last_ypos=0) {
  half_width = u_mm(width)/2;
  half_height = u_mm(height)/2;
  switch_base_pcb_traces(width=width, height=height, rgb=rgb, xpos=xpos, ypos=ypos, connections=connections, last_xpos=last_xpos, last_ypos=last_ypos, single=single) {
    translate([-3.8,-2.5,0])
      circle(d=4,$fn=40);
    translate([2.5,-5,0])
      circle(d=4,$fn=40);

    // Row
    v_left = connections[3] == "none" ? 1 : half_width;
    v_right = connections[2] == "none" ? 1 : half_width-5;
    translate([1-v_left,-5.9,0])
      square([v_left+v_right+3,0.8]);

    // Column
    translate([-1.2,-3,0])
      circle(d=2.5,$fn=40);
    translate([5,-2,0])
      circle(d=2.5,$fn=40);
    if(single){
      translate([6,-3.7,0])
        circle(d=2.5,$fn=40);
      difference() {
        translate([5,0,0])
          circle(d=3.55,$fn=40);
        translate([5,-2,0])
          square(4);
      }
      if(rgb) {
        translate([5,1.7,0])
          circle(d=2.3,$fn=40);
      } else {
        translate([4.2,1])
          square([0.8, half_height-2]);
        translate([-1,half_height-1.5])
          square([6,0.8]);
        translate([6,-8.3,0])
          circle(d=2.5,$fn=40);
        translate([-1.3,-8.7,0])
          square([7,0.8]);
      }
    }
  }
}

module switch_mx_pcb_traces_bottom(width=1, height=1, rgb=true, xpos=0, ypos=0, connections=["hole","hole","hole","hole"], last_xpos=0, last_ypos=0) {
  half_width = u_mm(width)/2;
  half_height = u_mm(height)/2;
  switch_base_pcb_traces_bottom(width=width, height=height, rgb=rgb, xpos=xpos, ypos=ypos, connections=connections, last_xpos=last_xpos, last_ypos=last_ypos) {
    translate([-3.8,-2.5,0])
      circle(d=4,$fn=40);
    translate([2.5,-5,0])
      circle(d=4,$fn=40);

    // Column
    translate([-1.2,-3,0])
      circle(d=2.5,$fn=40);
    translate([5,-2,0])
      circle(d=2.5,$fn=40);
    difference(){
      translate([2.5,-5,0])
        circle(d=5.9,$fn=40);
      translate([2.5,-5,0])
        circle(d=4.1,$fn=40);
      translate([0.3,-7,0])
        rotate(45)
          square(6);
    }
    translate([3.85,-3.45])
      square([0.8, 1]);

    t_height = connections[0] == "none" ? 1 : half_height-7.8;
    echo("h", 2-half_height, t_height);
    translate([-1.3,-t_height-6.8])
      square([0.8, t_height]);
    translate([-1.3,-7.2])
      square([2.2,0.8]);
    difference() {
      translate([5,0,0])
        circle(d=3.35,$fn=40);
      translate([5,-2,0])
        square(4);
    }
    b_height = connections[1] == "none" ? 2 : half_height-2;
    translate([4.2,1])
      square([0.8, b_height]);
    if(connections[1] != "none")
      translate([-1,half_height-1.5])
        square([6,0.8]);
  }
}

module switch_mx_pcb_outline(width=1, height=1) {
  pcb_switch_outline(width=width, height=height);
}
// file: ../../../lib/utilities.scad
function reverse(list) = len(list) > 0 ? [for (i = [1:len(list)]) list[len(list)-i]] : [];
function pop(list) = len(list) > 0 ? [for (i = [0:len(list)-1]) if (i != 0) list[i]] : [];
// file: ../../../lib/switches.scad
use <utilities.scad>
include <switches/mx.scad>
include <switches/choc_v1.scad>

module rotate_translate(rotation, xpos, ypos) {
  if(rotation[0] == undef || rotation[0] == 0) {
    translate([u_mm(xpos), u_mm(ypos), 0]) {
      children();
    }
  } else {
    xoff = rotation[1] == undef ? 0 : rotation[1];
    yoff = rotation[2] == undef ? 0 : rotation[2];
    angle = rotation[0] == undef ? 0 : rotation[0];
    translate([u_mm(xpos - xoff), u_mm(ypos - yoff), 0])
      rotate(angle)
        translate([u_mm(xoff), u_mm(yoff), 0])
          children();
  }
}

module switch(type, style="mx", rgb=true, xpos=0, ypos=0, width=1, cnc=false, rotation=[0,0,0], connections=["hole","hole","hole","hole"], last_xpos=0, last_ypos=0) {
  rotate_translate(rotation, xpos, ypos) {
    if(type == "outline")
      pcb_switch_outline(width=width);
    if(style == "mx") {
      if(type == "key")
        pcb_switch_space_outline(width=width, cnc=cnc, style="mx");
      if(type == "traces")
        switch_mx_pcb_traces(width=width, rgb=rgb, xpos=xpos, ypos=ypos, connections=connections, last_xpos=last_xpos, last_ypos=last_ypos);
      if(type == "traces_top")
        switch_mx_pcb_traces(width=width, single=false, rgb=rgb, xpos=xpos, ypos=ypos, connections=connections, last_xpos=last_xpos, last_ypos=last_ypos);
      if(type == "traces_bottom")
        switch_mx_pcb_traces_bottom(width=width, rgb=rgb, xpos=xpos, ypos=ypos, connections=connections, last_xpos=last_xpos, last_ypos=last_ypos);
      if(type == "drill")
        switch_mx_pcb_drill(width=width, rgb=rgb, connections=connections);
      if(type == "drill_double")
        switch_mx_pcb_drill(width=width, single=false, rgb=rgb, connections=connections);
    }

    if(style == "choc_v1") {
      if(type == "key")
        pcb_switch_space_outline(width=width, cnc=cnc, style="choc_v1");
      if(type == "traces")
        switch_choc_v1_pcb_traces(width=width);
      if(type == "traces_top")
        switch_choc_v1_pcb_traces(width=width);
      if(type == "traces_bottom")
        assert(false, "traces_bottom is incompatible with choc_v1");
      if(type == "drill")
        switch_choc_v1_pcb_drill(width=width);
      if(type == "drill_double")
        switch_choc_v1_pcb_drill(width=width, single=false);
    }

    if(style == "redragon") {
      if(type == "key")
        pcb_switch_space_outline(width=width, cnc=cnc, style="redragon");
      if(type == "traces")
        switch_mx_pcb_traces(width=width, rgb=rgb);
      if(type == "traces_top")
        switch_mx_pcb_traces(width=width, single=false, rgb=rgb);
      if(type == "traces_bottom")
        switch_mx_pcb_traces_bottom(width=width, rgb=rgb);
      if(type == "traces")
        switch_mx_pcb_traces(width=width, rgb=rgb);
      if(type == "drill")
        switch_mx_pcb_drill(width=width);
      if(type == "drill_double")
        switch_mx_pcb_drill(width=width, single=false);
    }
  }
}

module switch_row(keys, style="mx", rgb=true, margin=5, thickness=10, depth=0, cnc=false, type="key", last_row=[], last_xpos=0, previous_xpos=0, last_ypos=0, previous_ypos=0) {
  width = keys[0][0] == undef ? 1 : keys[0][0];
  xpos = keys[0][1] == undef ? 0 : keys[0][1];
  ypos = keys[0][2] == undef ? 0 : keys[0][2];
  rotation = keys[0][3] == undef ? [0,0,0] : keys[0][3];
  connections = keys[0][4] == undef ? ["hole","hole","hole","hole"] : keys[0][4];
  last_ypos = last_row[0][2] == undef ? last_ypos - previous_ypos : last_row[0][2]+last_ypos - previous_ypos;
  last_xpos = last_row[0][1] == undef ? last_xpos - previous_xpos : last_row[0][1]+last_xpos - previous_xpos;
  switch(type, style=style, rgb=rgb, xpos=xpos, ypos=ypos, width=width, cnc=cnc, rotation=rotation, connections=connections, last_xpos=last_xpos, last_ypos=last_ypos);
  if(len(keys) > 1) {
    translate([xpos*key_size+width*key_size, ypos*key_size, 0])
      switch_row(pop(keys), style=style, rgb=rgb, margin=margin, thickness=thickness, depth=depth, cnc=cnc, type=type, last_row = pop(last_row), last_xpos=last_xpos, previous_xpos=xpos, last_ypos=last_ypos, previous_ypos=ypos);
  }
}

module switches(switches, style="mx", rgb=true, margin=5, thickness=10, depth=0, cnc=false, type="key", last_row=[]) {
  if(len(switches) != 0) {
    switch_row(switches[0], style=style, rgb=rgb, margin=margin, thickness=thickness, depth=depth, cnc=cnc, type=type, last_row=last_row);
    if(len(switches) > 1) {
      last_row = switches[0];
      translate([0, key_size, 0])
        switches(pop(switches), style=style, rgb=rgb, margin=margin, depth=depth, thickness=thickness, cnc=cnc, type=type, last_row=last_row);
    }
  }
}
// file: ../../../lib/case.scad
include <variables.scad>
use <utilities.scad>
use <circuits.scad>

function key_width(key) = (key[0] == undef ? 1 : key[0]) + (key[1] == undef ? 0 : key[1]);
function width_row(row) = len(row) == 0 ? 0 : key_width(row[0]) + width_row(pop(row));
function width_board(rows) = len(rows) == 0 ? 0 : (
  let (current = width_row(rows[0]))
  let (next = width_board(pop(rows)))
    current > next ? current : next);

function key_height(key) = (key[2] == undef ? 0 : key[2]);
function height_row(row) = len(row) == 0 ? [0,0] : (
  let(other_rows = height_row(pop(row)))
  let(current = key_height(row[0]) + other_rows[0])
  let(maximum = current > other_rows[1] ? current : other_rows[1])
  [current, maximum]);
function height_board_rec(rows) = len(rows) == 0 ? 0 : (
  let (current = height_row(reverse(rows[0]))[1])
  let (next = height_board_rec(pop(rows)))
    current > next ? current : next);
function height_board(rows) = 
  let (height_rec = height_board_rec(rows))
    len(rows) + (height_rec > 0 ? height_rec : 0);

module case(rows, style="mx", margin=5, thickness=5, depth=0, radius=2, rest=0, circuits=[], _inherit_children="unset") {
  total_thickness = thickness + depth + height_for_style(style);
  z_offset = depth + height_for_style(style);
  if($children != 0 && (_inherit_children == "unset" || _inherit_children > 0)) {
    translate([0, 0, -z_offset])
      linear_extrude(total_thickness)
        offset(margin)
          children();
  } else {
    width=u_mm(width_board(rows))+margin*2;
    height=u_mm(height_board(rows))+margin*2+rest;
    translate([-margin, -margin, -z_offset]){
      translate([radius, 0, 0])
        cube([width-radius*2, height,total_thickness]);
      translate([0, radius, 0])
        cube([width, height-radius*2,total_thickness]);
      translate([radius, radius, 0])
        cylinder(total_thickness,radius,radius, $fn=60);
      translate([width-radius, radius, 0])
        cylinder(total_thickness,radius,radius, $fn=60);
      translate([width-radius, height-radius, 0])
        cylinder(total_thickness,radius,radius, $fn=60);
      translate([radius, height-radius, 0])
        cylinder(total_thickness,radius,radius, $fn=60);
    }
    if(len(circuits) > 0)
      translate([0, 0, -z_offset])
        linear_extrude(total_thickness)
          offset(margin)
            circuits_pcb_outline(circuits);
  }
}
// file: ../../../lib/variables.scad
key_size=19.05;
hole=14;

function u_mm(u) = u*key_size;
function hole_offset(u) = (key_size-hole)/2+u_mm(u-1)/2;

// This is used to determine how much space is between the top
// of the plate and the PCB.
function height_for_style(style) = style == "mx"        ? 5.334 :
                                   style == "redragon" ? 3.75  :
                                   style == "choc_v1"   ? 2.2   :  "invalid style";
// file: base.scad
function circuit() = [[8,0,0,0,"pro_micro"],[9.1,0,0,0,"trrs_right"],];

function layout() = [
  [[6.26], [1,1,1,[20,1,2]]],
  [[2.25],[1.75],[1.25],[]]
];

module the_case() {
  translate([-u_mm(1), -u_mm(1)])
    square([u_mm(10), u_mm(5)]);
}

include <../../../keyboard.scad>
// main file
use <base.scad>

bottom_case(layout(), thickness=30, circuits=circuit())
  the_case();
